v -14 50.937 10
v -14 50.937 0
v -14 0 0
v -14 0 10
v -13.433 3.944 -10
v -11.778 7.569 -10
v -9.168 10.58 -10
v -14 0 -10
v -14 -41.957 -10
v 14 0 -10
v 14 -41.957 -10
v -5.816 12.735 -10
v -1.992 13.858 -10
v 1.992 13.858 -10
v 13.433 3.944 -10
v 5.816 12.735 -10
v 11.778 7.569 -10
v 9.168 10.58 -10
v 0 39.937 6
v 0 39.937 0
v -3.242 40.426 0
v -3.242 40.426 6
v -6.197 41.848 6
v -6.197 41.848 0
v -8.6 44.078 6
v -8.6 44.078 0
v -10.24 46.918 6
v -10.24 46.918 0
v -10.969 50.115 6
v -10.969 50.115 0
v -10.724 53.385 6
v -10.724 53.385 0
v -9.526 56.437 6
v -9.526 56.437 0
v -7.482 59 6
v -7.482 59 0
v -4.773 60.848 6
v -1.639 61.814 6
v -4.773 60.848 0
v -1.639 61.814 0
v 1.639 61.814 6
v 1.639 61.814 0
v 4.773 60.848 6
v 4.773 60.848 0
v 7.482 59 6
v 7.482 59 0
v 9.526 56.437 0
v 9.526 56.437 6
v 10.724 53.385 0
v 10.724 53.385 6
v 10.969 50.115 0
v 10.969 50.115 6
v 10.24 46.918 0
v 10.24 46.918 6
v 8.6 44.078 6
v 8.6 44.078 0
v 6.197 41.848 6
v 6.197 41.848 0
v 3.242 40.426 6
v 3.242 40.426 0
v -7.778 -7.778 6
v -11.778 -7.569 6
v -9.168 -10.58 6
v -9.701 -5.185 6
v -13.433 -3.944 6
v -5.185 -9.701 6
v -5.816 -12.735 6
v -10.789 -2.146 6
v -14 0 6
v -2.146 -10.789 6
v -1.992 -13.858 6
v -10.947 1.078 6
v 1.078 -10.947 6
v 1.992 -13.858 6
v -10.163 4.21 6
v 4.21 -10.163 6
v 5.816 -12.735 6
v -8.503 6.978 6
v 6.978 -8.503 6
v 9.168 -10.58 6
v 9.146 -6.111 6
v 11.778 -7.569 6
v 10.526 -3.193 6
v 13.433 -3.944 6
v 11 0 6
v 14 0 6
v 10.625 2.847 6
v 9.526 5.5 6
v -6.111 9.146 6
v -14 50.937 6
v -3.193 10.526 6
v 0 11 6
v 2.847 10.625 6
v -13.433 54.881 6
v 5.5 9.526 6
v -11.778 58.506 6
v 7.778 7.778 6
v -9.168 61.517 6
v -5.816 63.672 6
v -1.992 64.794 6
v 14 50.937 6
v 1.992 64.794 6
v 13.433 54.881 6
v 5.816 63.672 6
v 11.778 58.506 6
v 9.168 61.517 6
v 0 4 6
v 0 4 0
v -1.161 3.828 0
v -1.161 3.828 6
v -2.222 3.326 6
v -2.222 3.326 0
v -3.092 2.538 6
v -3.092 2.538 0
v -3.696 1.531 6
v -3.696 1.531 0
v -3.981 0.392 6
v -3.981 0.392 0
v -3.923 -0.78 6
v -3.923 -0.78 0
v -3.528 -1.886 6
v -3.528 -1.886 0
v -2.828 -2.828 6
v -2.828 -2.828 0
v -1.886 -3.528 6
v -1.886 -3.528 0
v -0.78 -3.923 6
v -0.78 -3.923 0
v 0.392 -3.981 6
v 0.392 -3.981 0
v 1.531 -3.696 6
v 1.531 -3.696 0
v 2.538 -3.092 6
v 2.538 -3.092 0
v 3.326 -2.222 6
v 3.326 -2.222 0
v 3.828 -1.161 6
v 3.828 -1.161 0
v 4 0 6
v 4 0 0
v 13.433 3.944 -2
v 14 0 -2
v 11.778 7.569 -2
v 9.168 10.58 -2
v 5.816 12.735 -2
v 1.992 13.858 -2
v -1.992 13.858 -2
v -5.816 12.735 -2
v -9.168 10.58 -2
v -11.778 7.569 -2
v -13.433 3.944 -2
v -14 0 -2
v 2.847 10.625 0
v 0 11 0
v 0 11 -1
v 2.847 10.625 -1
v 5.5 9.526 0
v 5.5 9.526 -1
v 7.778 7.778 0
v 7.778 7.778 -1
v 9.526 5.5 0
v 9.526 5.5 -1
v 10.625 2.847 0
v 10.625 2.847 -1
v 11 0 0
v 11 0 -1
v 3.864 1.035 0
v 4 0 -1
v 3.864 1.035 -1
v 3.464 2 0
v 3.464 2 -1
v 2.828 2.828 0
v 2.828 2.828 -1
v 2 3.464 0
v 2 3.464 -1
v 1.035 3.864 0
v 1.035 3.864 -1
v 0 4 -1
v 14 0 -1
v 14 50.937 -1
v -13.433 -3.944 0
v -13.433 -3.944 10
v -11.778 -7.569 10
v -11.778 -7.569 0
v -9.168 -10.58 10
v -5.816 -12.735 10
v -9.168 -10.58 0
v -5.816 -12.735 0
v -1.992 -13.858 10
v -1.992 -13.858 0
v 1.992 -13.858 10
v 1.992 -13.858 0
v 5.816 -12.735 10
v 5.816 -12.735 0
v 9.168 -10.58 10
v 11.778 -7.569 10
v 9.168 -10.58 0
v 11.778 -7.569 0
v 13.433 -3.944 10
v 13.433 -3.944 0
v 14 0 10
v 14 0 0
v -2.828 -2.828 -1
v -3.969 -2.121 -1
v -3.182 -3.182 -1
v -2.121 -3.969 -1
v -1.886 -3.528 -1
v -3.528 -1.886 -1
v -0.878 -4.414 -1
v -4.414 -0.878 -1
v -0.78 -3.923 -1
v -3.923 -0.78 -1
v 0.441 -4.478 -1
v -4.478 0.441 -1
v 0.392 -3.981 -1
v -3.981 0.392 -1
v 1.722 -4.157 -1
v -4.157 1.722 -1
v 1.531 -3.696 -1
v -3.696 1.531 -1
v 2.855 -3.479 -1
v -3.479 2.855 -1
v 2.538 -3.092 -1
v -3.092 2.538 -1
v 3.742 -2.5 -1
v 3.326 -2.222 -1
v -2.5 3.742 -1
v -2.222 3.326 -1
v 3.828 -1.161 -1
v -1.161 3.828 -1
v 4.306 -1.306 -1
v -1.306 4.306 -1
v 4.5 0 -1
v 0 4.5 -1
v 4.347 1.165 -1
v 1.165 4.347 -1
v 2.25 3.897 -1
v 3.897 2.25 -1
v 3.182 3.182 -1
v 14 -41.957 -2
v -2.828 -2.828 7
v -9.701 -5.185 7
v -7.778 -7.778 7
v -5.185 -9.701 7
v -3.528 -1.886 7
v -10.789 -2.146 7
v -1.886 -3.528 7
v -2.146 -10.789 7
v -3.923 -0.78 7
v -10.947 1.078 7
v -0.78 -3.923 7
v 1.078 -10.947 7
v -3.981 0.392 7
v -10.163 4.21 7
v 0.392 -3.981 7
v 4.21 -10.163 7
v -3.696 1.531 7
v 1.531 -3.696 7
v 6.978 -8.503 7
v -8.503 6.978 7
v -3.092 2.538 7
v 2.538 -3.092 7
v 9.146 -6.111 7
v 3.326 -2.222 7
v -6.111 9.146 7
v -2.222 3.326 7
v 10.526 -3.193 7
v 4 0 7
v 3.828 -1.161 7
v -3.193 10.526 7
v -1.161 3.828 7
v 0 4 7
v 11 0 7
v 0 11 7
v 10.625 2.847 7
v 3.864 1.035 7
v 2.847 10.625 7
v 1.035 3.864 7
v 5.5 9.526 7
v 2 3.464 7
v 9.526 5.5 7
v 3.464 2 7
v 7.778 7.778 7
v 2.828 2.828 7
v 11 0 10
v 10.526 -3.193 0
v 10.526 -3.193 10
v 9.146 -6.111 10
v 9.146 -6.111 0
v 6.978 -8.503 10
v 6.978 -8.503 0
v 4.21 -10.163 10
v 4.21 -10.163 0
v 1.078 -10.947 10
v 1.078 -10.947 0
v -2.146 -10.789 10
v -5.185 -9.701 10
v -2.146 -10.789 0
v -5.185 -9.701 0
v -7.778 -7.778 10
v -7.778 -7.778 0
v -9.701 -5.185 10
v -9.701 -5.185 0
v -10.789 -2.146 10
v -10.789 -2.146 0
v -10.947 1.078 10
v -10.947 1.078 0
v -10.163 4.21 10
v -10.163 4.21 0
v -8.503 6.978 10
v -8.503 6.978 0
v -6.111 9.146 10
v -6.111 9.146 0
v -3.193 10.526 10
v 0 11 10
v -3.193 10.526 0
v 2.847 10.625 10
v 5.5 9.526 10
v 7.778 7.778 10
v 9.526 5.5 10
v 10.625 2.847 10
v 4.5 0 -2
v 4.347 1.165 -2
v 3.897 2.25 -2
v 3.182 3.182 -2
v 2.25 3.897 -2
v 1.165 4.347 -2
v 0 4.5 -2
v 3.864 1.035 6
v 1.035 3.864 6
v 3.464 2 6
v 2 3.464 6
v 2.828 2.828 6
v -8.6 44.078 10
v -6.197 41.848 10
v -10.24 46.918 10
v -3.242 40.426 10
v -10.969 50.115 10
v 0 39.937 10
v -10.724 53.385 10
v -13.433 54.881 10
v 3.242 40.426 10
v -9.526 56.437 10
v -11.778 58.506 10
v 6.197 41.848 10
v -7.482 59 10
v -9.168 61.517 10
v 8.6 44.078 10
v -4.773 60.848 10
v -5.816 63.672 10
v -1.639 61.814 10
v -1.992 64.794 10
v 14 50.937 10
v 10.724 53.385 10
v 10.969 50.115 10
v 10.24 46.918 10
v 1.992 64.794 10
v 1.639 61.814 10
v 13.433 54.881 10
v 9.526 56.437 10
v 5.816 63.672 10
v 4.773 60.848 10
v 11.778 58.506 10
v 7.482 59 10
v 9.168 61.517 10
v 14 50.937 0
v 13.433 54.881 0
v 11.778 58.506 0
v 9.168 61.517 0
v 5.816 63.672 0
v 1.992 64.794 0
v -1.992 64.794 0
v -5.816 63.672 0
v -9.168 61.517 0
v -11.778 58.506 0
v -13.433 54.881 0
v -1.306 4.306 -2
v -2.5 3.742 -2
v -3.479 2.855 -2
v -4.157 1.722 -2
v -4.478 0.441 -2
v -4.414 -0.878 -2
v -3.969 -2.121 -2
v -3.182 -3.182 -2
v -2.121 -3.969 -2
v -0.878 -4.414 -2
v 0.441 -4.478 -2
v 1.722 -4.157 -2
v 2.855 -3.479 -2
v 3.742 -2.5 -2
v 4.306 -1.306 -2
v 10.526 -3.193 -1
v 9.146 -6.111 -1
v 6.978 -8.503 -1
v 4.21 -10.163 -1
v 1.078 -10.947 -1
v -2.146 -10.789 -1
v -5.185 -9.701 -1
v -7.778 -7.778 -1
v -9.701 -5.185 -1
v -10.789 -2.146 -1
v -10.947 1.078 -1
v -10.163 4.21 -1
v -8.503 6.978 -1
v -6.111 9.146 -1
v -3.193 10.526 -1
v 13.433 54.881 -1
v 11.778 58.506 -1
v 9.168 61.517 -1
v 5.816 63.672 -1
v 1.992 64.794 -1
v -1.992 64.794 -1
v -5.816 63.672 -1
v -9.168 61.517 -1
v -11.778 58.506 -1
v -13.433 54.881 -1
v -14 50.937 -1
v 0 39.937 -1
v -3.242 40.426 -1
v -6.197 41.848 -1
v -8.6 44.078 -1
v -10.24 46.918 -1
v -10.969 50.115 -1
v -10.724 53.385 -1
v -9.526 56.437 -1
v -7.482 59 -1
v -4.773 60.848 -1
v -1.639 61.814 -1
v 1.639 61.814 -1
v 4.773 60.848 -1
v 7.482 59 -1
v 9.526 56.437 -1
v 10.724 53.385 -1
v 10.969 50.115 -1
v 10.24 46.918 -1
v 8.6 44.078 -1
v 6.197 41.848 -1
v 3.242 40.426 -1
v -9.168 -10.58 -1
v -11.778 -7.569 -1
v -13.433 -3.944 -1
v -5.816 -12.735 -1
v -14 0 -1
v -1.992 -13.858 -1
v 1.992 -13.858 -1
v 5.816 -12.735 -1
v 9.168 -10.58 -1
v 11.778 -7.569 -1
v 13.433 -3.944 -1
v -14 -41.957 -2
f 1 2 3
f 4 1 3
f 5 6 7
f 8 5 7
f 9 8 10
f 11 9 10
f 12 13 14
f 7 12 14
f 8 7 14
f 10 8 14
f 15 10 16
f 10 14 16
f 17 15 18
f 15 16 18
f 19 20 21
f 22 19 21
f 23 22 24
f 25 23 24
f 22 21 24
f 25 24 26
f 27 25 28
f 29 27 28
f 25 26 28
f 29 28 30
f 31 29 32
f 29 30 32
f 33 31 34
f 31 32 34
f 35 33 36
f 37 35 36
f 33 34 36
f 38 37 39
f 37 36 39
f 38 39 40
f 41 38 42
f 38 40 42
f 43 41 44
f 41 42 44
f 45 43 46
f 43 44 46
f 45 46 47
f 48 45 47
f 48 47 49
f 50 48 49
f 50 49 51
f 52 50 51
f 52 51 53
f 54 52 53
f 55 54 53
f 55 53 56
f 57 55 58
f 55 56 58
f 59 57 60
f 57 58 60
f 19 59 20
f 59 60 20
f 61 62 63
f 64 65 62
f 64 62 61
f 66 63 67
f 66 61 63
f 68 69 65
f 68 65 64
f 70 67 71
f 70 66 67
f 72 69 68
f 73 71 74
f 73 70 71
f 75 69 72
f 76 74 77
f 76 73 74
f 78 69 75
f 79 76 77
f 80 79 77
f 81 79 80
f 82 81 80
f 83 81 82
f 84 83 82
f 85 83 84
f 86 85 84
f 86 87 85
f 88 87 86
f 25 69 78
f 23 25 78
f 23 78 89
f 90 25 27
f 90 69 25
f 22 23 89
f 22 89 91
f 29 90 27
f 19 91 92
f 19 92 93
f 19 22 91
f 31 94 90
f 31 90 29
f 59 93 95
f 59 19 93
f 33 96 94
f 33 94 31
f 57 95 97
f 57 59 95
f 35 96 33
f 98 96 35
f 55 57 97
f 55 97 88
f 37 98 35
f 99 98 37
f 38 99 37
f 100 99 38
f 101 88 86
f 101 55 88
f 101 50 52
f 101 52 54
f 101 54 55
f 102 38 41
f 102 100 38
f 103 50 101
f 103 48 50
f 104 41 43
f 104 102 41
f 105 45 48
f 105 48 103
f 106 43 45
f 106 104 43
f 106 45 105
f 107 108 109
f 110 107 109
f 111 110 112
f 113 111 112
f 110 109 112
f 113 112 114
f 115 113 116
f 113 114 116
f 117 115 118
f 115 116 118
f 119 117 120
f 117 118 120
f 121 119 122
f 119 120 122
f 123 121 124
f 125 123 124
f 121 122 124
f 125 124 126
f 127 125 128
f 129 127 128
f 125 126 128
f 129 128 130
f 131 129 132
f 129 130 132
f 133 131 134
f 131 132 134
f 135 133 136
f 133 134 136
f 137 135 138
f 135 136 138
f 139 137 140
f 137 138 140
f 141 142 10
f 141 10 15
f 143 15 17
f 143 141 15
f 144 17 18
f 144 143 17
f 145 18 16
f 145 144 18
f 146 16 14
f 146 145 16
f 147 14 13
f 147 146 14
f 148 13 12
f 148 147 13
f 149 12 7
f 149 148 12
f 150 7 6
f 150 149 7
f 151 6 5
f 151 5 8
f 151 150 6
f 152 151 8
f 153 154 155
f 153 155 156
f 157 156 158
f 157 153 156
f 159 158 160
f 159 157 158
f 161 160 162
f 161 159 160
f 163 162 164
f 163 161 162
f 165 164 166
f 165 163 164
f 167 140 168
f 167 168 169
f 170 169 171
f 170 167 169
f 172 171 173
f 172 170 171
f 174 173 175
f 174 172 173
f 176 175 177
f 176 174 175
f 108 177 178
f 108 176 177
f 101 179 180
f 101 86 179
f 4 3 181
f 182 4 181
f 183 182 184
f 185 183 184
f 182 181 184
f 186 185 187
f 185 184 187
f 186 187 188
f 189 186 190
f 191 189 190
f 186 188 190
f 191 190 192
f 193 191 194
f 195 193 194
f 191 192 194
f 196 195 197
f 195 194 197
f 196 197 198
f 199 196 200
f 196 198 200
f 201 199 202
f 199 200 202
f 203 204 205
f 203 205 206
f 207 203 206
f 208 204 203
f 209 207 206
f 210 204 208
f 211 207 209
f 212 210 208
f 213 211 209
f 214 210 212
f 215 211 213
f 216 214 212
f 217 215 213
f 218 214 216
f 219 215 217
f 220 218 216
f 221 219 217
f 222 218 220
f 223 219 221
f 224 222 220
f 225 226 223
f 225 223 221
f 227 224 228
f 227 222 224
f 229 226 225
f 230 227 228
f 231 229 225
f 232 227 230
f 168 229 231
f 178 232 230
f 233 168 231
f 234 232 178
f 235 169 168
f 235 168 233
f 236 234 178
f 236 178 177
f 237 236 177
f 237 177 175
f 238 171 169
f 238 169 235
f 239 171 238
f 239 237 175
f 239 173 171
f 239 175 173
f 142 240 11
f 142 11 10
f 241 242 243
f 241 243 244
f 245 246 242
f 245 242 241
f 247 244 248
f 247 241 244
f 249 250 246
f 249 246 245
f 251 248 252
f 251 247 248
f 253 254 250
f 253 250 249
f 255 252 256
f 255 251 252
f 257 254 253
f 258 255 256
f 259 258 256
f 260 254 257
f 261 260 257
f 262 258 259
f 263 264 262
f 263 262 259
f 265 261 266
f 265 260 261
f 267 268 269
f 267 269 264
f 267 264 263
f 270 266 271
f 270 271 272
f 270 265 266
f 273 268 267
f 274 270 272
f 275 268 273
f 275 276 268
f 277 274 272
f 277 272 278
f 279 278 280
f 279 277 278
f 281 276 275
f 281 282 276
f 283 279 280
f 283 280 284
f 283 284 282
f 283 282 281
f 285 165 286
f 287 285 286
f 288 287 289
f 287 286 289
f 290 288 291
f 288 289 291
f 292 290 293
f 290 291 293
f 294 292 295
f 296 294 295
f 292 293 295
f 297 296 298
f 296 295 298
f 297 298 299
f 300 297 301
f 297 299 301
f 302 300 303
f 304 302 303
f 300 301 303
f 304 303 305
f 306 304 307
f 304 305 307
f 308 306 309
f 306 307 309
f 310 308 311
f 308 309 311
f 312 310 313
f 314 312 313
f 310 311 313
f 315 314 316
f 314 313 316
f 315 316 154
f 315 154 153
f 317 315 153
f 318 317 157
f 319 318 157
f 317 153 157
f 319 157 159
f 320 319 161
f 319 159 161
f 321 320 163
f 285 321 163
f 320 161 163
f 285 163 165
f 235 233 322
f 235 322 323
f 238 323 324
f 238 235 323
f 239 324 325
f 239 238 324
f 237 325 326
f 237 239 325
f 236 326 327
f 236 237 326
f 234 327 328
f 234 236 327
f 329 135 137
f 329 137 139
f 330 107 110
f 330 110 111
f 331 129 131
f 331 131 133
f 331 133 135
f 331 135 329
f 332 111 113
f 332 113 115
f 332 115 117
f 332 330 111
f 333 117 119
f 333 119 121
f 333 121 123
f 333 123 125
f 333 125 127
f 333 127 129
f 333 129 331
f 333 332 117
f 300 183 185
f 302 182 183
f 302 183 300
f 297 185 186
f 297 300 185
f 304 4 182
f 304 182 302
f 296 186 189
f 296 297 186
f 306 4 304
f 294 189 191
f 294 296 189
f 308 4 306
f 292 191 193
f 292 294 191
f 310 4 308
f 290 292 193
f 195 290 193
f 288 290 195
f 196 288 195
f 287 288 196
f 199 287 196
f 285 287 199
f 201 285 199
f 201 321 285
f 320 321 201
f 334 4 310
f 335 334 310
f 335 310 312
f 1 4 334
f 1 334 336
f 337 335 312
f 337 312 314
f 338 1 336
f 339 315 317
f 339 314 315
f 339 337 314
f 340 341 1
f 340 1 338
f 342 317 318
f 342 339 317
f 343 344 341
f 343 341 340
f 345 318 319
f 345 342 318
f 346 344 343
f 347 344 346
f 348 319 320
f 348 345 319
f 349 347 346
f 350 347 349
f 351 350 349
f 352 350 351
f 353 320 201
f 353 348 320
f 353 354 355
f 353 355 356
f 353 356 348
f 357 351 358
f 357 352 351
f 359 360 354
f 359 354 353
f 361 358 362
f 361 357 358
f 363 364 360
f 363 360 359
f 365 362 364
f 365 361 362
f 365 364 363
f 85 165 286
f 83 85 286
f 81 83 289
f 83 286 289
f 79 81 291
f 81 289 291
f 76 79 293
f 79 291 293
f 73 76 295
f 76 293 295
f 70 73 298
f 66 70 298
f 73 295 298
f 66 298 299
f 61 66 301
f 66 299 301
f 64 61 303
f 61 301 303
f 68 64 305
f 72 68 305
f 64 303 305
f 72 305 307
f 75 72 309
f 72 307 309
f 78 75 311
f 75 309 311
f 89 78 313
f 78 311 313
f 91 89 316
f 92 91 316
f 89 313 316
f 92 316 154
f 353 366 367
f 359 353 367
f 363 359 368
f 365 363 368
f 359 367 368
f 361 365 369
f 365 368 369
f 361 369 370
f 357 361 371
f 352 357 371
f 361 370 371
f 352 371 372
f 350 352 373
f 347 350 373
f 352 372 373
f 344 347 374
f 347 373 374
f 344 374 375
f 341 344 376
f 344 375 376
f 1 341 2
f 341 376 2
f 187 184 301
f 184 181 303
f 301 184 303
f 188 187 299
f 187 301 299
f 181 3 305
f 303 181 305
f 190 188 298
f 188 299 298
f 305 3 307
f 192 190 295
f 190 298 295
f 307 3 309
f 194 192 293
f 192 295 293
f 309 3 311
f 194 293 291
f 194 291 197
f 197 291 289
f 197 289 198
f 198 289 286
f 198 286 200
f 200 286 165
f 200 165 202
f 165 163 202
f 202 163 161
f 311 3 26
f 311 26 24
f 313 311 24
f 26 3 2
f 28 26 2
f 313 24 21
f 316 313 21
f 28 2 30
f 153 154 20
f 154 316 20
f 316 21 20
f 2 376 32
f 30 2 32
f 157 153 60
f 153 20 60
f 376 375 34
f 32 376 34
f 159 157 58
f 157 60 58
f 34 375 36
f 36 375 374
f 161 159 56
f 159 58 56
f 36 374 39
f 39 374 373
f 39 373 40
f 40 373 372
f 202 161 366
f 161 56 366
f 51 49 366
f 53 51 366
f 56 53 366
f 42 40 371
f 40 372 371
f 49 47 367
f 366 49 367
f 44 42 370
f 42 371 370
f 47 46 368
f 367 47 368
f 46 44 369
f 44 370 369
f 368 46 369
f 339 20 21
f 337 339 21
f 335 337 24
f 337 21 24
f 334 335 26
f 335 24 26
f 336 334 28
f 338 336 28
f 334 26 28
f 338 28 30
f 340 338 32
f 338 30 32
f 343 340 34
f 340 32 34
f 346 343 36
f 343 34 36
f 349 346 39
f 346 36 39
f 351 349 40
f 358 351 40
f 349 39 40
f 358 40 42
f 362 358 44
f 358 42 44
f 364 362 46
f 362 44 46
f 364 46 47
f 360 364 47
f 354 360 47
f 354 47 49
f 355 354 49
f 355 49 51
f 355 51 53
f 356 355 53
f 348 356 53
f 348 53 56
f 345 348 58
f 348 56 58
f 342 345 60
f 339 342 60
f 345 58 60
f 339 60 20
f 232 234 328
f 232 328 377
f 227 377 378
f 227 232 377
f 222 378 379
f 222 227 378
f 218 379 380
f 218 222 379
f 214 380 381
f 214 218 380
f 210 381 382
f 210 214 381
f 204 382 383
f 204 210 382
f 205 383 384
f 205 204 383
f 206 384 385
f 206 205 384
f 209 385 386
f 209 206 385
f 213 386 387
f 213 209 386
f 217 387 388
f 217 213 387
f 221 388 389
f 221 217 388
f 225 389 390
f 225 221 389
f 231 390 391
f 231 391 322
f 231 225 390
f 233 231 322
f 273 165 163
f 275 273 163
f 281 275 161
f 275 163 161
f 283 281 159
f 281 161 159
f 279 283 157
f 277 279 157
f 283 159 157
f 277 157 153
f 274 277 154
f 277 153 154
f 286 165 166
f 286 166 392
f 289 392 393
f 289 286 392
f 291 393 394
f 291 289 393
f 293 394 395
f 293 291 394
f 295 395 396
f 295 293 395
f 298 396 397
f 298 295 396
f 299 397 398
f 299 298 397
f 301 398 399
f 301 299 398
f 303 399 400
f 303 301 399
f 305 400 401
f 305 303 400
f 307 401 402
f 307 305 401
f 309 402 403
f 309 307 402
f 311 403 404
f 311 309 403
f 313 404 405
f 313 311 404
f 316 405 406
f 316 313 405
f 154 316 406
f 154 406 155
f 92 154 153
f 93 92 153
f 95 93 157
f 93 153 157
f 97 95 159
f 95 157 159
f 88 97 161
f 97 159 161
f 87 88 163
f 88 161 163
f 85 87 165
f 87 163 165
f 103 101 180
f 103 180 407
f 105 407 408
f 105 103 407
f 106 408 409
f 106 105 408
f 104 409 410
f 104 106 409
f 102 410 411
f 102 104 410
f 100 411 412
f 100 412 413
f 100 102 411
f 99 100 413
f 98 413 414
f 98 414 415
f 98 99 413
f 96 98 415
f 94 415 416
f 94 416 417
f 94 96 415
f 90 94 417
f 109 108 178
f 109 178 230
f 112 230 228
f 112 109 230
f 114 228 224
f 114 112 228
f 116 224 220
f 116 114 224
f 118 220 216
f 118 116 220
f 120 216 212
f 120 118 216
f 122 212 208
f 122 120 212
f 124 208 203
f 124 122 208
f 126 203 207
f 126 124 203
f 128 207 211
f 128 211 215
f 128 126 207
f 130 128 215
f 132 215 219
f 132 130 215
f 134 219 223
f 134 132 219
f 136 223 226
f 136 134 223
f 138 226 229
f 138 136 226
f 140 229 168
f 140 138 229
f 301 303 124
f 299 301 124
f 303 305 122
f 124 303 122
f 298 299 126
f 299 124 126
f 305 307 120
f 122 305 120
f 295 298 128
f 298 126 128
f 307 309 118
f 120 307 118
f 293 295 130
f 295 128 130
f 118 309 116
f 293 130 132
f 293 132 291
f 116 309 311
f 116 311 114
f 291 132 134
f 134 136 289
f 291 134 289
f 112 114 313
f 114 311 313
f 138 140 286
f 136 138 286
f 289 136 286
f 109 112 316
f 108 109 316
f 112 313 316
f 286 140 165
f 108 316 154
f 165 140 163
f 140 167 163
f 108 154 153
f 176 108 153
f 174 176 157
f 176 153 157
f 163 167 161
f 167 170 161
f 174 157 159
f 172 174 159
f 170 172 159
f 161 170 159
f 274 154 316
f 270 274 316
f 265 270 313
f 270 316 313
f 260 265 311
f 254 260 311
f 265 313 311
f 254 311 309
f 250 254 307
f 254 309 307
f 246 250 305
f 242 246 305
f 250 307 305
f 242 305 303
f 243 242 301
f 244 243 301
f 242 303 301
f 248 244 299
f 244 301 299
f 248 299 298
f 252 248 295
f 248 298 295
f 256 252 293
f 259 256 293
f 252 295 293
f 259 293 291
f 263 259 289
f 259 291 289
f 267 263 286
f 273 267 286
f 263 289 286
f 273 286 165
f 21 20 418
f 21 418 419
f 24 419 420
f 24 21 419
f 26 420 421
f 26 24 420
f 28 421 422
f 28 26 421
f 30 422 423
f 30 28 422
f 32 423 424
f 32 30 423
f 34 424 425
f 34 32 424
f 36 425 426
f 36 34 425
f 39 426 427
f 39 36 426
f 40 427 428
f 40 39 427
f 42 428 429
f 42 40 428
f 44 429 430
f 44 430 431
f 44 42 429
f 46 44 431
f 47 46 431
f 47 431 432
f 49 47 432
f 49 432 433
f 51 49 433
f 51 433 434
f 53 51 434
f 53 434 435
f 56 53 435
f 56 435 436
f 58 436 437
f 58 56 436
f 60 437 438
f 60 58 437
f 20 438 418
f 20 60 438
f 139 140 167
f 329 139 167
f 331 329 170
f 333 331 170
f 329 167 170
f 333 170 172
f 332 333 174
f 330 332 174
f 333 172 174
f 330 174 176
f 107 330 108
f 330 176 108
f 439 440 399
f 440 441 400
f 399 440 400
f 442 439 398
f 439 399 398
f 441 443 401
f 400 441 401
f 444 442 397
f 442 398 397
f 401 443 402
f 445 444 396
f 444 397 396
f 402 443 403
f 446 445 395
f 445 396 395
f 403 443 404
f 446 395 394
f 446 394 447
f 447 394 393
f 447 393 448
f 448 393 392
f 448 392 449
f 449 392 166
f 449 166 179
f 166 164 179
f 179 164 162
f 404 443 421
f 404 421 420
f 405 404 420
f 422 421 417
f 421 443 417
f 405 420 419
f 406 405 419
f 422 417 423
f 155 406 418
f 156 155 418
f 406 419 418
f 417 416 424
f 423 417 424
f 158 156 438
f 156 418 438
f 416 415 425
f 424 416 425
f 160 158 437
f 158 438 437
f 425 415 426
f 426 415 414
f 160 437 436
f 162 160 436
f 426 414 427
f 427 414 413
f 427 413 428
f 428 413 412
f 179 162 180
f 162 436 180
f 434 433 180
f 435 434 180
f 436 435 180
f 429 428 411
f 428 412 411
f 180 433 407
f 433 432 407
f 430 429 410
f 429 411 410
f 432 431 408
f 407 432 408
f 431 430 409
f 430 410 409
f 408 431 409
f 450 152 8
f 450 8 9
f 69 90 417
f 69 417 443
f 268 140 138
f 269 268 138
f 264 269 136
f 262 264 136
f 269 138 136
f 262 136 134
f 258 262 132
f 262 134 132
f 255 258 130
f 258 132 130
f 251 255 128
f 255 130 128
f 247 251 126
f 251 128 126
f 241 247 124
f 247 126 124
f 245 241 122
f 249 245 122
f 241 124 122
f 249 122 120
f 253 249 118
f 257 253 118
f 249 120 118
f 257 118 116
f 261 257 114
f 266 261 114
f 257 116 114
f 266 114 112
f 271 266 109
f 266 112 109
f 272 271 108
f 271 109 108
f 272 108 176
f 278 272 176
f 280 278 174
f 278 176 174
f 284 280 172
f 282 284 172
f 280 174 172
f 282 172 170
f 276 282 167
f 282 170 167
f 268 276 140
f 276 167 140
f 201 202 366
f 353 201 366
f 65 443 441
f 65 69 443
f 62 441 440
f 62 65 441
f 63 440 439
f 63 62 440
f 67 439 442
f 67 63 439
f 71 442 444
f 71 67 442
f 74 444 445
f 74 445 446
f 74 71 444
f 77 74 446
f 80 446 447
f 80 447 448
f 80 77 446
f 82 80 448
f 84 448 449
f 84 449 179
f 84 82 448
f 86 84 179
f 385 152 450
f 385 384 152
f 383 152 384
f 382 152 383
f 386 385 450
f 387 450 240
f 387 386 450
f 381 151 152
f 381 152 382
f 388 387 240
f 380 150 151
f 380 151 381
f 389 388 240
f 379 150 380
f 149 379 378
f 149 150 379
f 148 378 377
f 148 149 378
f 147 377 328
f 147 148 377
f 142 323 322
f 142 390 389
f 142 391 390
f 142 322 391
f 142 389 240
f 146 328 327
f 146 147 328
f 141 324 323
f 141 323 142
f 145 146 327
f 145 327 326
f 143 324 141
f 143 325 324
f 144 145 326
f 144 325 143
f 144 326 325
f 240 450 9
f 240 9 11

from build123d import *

# Parameters (mm, degrees)
F1_DEPTH      = 7
F2_DEPTH      = 10
F3_DEPTH      = 6
F3_DEPTH_BACK = 1
F4_START      = -1
F4_DEPTH      = 6.2
F6_START      = -2
F6_DEPTH      = 8
F7_START      = -2
F7_DEPTH      = 8
F8_DEPTH      = 6
F8_DEPTH_BACK = 1


with BuildPart() as f1:
    # F0 (on Top) → F1 (new body)
    with BuildSketch(Plane.XY):
        with BuildLine():
            ThreePointArc((0, 4), (2.8284271247, 2.8284271247), (4, 0))
            Line((4, 0), (4.5, 0))
            ThreePointArc((4.5, 0), (3.1819805153, 3.1819805153), (0, 4.5))
            Line((0, 4.5), (0, 4))
        make_face()
        with BuildLine():
            Line((4.5, 0), (4, 0))
            ThreePointArc((4, 0), (-2.8284271247, -2.8284271247), (0, 4))
            Line((0, 4), (0, 4.5))
            ThreePointArc((0, 4.5), (-3.1819805153, -3.1819805153), (4.5, 0))
        make_face()
        with BuildLine():
            ThreePointArc((0, 4.5), (3.1819805153, 3.1819805153), (4.5, 0))
            Line((4.5, 0), (11, 0))
            ThreePointArc((11, 0), (7.7781745931, 7.7781745931), (0, 11))
            Line((0, 11), (0, 4.5))
        make_face()
        with BuildLine():
            Line((11, 0), (4.5, 0))
            ThreePointArc((4.5, 0), (-3.1819805153, -3.1819805153), (0, 4.5))
            Line((0, 4.5), (0, 11))
            ThreePointArc((0, 11), (-7.7781745931, -7.7781745931), (11, 0))
        make_face()
    extrude(amount=F1_DEPTH)


with BuildPart() as f2:
    # F0 (on Top) → F2 (new body)
    with BuildSketch(Plane.XY):
        with BuildLine():
            ThreePointArc((0, 11), (7.7781745931, 7.7781745931), (11, 0))
            Line((11, 0), (14, 0))
            ThreePointArc((14, 0), (9.8994949366, 9.8994949366), (0, 14))
            Line((0, 14), (0, 11))
        make_face()
        with BuildLine():
            Line((14, 0), (11, 0))
            ThreePointArc((11, 0), (-7.7781745931, -7.7781745931), (0, 11))
            Line((0, 11), (0, 14))
            ThreePointArc((0, 14), (-9.8994949366, 9.8994949366), (-14, 0))
            ThreePointArc((-14, 0), (0, -14), (14, 0))
        make_face()
        with BuildLine():
            ThreePointArc((0, 14), (9.8994949366, 9.8994949366), (14, 0))
            Line((14, 0), (14, 50.9368740022))
            ThreePointArc((14, 50.9368740022), (9.8994949366, 41.0373790656), (0, 36.9368740022))
            Line((0, 36.9368740022), (0, 14))
        make_face()
        with BuildLine():
            ThreePointArc((-14, 0), (-9.8994949366, 9.8994949366), (0, 14))
            Line((0, 14), (0, 36.9368740022))
            ThreePointArc((0, 36.9368740022), (-9.8994949366, 41.0373790656), (-14, 50.9368740022))
            Line((-14, 50.9368740022), (-14, 0))
        make_face()
        with BuildLine():
            Line((11, 50.9368740022), (14, 50.9368740022))
            ThreePointArc((14, 50.9368740022), (0, 64.9368740022), (-14, 50.9368740022))
            Line((-14, 50.9368740022), (-11, 50.9368740022))
            ThreePointArc((-11, 50.9368740022), (0, 61.9368740022), (11, 50.9368740022))
        make_face()
        with BuildLine():
            ThreePointArc((0, 36.9368740022), (9.8994949366, 41.0373790656), (14, 50.9368740022))
            Line((14, 50.9368740022), (11, 50.9368740022))
            ThreePointArc((11, 50.9368740022), (7.7781745931, 43.1586994092), (0, 39.9368740022))
            Line((0, 39.9368740022), (0, 36.9368740022))
        make_face()
        with BuildLine():
            ThreePointArc((-14, 50.9368740022), (-9.8994949366, 41.0373790656), (0, 36.9368740022))
            Line((0, 36.9368740022), (0, 39.9368740022))
            ThreePointArc((0, 39.9368740022), (-7.7781745931, 43.1586994092), (-11, 50.9368740022))
            Line((-11, 50.9368740022), (-14, 50.9368740022))
        make_face()
    extrude(amount=F2_DEPTH)


with BuildPart() as f3:
    # F0 (on Top) → F3 (new body, two sides)
    with BuildSketch(Plane.XY) as f3_sk:
        with BuildLine():
            ThreePointArc((0, 4), (-2.8284271247, -2.8284271247), (4, 0))
            Line((4, 0), (0, 0))
            Line((0, 0), (0, 4))
        make_face()
        with BuildLine():
            Line((0, 0), (4, 0))
            ThreePointArc((4, 0), (2.8284271247, 2.8284271247), (0, 4))
            Line((0, 4), (0, 0))
        make_face()
    extrude(amount=F3_DEPTH)
    extrude(f3_sk.sketch, amount=-F3_DEPTH_BACK)

    # F0 (on Top) → F4 (join)
    with BuildSketch(Plane.XY.offset(F4_START)):
        with BuildLine():
            Line((4.5, 0), (4, 0))
            ThreePointArc((4, 0), (-2.8284271247, -2.8284271247), (0, 4))
            Line((0, 4), (0, 4.5))
            ThreePointArc((0, 4.5), (-3.1819805153, -3.1819805153), (4.5, 0))
        make_face()
        with BuildLine():
            ThreePointArc((0, 4), (2.8284271247, 2.8284271247), (4, 0))
            Line((4, 0), (4.5, 0))
            ThreePointArc((4.5, 0), (3.1819805153, 3.1819805153), (0, 4.5))
            Line((0, 4.5), (0, 4))
        make_face()
        with BuildLine():
            Line((0, 0), (4, 0))
            ThreePointArc((4, 0), (2.8284271247, 2.8284271247), (0, 4))
            Line((0, 4), (0, 0))
        make_face()
        with BuildLine():
            ThreePointArc((0, 4), (-2.8284271247, -2.8284271247), (4, 0))
            Line((4, 0), (0, 0))
            Line((0, 0), (0, 4))
        make_face()
    extrude(amount=-F4_DEPTH)

    # F5 (on Top) → F6 (join)
    with BuildSketch(Plane.XY.offset(F6_START)):
        with BuildLine():
            Line((-14, 0), (14, 0))
            ThreePointArc((14, 0), (0, 14), (-14, 0))
        make_face()
        with BuildLine():
            ThreePointArc((-14, 0), (0, -14), (14, 0))
            Line((14, 0), (-14, 0))
        make_face()
    extrude(amount=-F6_DEPTH)

    # F5 (on Top) → F7 (join)
    with BuildSketch(Plane.XY.offset(F7_START)):
        with BuildLine():
            Line((14, -41.9565960765), (14, 0))
            ThreePointArc((14, 0), (0, -14), (-14, 0))
            Line((-14, 0), (-14, -41.9565960765))
            Line((-14, -41.9565960765), (14, -41.9565960765))
        make_face()
    extrude(amount=-F7_DEPTH)


with BuildPart() as f8:
    # F0 (on Top) → F8 (new body, two sides)
    with BuildSketch(Plane.XY) as f8_sk:
        with BuildLine():
            Line((14, 0), (11, 0))
            ThreePointArc((11, 0), (-7.7781745931, -7.7781745931), (0, 11))
            Line((0, 11), (0, 14))
            ThreePointArc((0, 14), (-9.8994949366, 9.8994949366), (-14, 0))
            ThreePointArc((-14, 0), (0, -14), (14, 0))
        make_face()
        with BuildLine():
            ThreePointArc((0, 11), (7.7781745931, 7.7781745931), (11, 0))
            Line((11, 0), (14, 0))
            ThreePointArc((14, 0), (9.8994949366, 9.8994949366), (0, 14))
            Line((0, 14), (0, 11))
        make_face()
        with BuildLine():
            ThreePointArc((0, 14), (9.8994949366, 9.8994949366), (14, 0))
            Line((14, 0), (14, 50.9368740022))
            ThreePointArc((14, 50.9368740022), (9.8994949366, 41.0373790656), (0, 36.9368740022))
            Line((0, 36.9368740022), (0, 14))
        make_face()
        with BuildLine():
            ThreePointArc((-14, 0), (-9.8994949366, 9.8994949366), (0, 14))
            Line((0, 14), (0, 36.9368740022))
            ThreePointArc((0, 36.9368740022), (-9.8994949366, 41.0373790656), (-14, 50.9368740022))
            Line((-14, 50.9368740022), (-14, 0))
        make_face()
        with BuildLine():
            ThreePointArc((-14, 50.9368740022), (-9.8994949366, 41.0373790656), (0, 36.9368740022))
            Line((0, 36.9368740022), (0, 39.9368740022))
            ThreePointArc((0, 39.9368740022), (-7.7781745931, 43.1586994092), (-11, 50.9368740022))
            Line((-11, 50.9368740022), (-14, 50.9368740022))
        make_face()
        with BuildLine():
            Line((11, 50.9368740022), (14, 50.9368740022))
            ThreePointArc((14, 50.9368740022), (0, 64.9368740022), (-14, 50.9368740022))
            Line((-14, 50.9368740022), (-11, 50.9368740022))
            ThreePointArc((-11, 50.9368740022), (0, 61.9368740022), (11, 50.9368740022))
        make_face()
        with BuildLine():
            ThreePointArc((0, 36.9368740022), (9.8994949366, 41.0373790656), (14, 50.9368740022))
            Line((14, 50.9368740022), (11, 50.9368740022))
            ThreePointArc((11, 50.9368740022), (7.7781745931, 43.1586994092), (0, 39.9368740022))
            Line((0, 39.9368740022), (0, 36.9368740022))
        make_face()
    extrude(amount=F8_DEPTH)
    extrude(f8_sk.sketch, amount=-F8_DEPTH_BACK)


solid = Compound([f1.part, f2.part, f3.part, f8.part])
